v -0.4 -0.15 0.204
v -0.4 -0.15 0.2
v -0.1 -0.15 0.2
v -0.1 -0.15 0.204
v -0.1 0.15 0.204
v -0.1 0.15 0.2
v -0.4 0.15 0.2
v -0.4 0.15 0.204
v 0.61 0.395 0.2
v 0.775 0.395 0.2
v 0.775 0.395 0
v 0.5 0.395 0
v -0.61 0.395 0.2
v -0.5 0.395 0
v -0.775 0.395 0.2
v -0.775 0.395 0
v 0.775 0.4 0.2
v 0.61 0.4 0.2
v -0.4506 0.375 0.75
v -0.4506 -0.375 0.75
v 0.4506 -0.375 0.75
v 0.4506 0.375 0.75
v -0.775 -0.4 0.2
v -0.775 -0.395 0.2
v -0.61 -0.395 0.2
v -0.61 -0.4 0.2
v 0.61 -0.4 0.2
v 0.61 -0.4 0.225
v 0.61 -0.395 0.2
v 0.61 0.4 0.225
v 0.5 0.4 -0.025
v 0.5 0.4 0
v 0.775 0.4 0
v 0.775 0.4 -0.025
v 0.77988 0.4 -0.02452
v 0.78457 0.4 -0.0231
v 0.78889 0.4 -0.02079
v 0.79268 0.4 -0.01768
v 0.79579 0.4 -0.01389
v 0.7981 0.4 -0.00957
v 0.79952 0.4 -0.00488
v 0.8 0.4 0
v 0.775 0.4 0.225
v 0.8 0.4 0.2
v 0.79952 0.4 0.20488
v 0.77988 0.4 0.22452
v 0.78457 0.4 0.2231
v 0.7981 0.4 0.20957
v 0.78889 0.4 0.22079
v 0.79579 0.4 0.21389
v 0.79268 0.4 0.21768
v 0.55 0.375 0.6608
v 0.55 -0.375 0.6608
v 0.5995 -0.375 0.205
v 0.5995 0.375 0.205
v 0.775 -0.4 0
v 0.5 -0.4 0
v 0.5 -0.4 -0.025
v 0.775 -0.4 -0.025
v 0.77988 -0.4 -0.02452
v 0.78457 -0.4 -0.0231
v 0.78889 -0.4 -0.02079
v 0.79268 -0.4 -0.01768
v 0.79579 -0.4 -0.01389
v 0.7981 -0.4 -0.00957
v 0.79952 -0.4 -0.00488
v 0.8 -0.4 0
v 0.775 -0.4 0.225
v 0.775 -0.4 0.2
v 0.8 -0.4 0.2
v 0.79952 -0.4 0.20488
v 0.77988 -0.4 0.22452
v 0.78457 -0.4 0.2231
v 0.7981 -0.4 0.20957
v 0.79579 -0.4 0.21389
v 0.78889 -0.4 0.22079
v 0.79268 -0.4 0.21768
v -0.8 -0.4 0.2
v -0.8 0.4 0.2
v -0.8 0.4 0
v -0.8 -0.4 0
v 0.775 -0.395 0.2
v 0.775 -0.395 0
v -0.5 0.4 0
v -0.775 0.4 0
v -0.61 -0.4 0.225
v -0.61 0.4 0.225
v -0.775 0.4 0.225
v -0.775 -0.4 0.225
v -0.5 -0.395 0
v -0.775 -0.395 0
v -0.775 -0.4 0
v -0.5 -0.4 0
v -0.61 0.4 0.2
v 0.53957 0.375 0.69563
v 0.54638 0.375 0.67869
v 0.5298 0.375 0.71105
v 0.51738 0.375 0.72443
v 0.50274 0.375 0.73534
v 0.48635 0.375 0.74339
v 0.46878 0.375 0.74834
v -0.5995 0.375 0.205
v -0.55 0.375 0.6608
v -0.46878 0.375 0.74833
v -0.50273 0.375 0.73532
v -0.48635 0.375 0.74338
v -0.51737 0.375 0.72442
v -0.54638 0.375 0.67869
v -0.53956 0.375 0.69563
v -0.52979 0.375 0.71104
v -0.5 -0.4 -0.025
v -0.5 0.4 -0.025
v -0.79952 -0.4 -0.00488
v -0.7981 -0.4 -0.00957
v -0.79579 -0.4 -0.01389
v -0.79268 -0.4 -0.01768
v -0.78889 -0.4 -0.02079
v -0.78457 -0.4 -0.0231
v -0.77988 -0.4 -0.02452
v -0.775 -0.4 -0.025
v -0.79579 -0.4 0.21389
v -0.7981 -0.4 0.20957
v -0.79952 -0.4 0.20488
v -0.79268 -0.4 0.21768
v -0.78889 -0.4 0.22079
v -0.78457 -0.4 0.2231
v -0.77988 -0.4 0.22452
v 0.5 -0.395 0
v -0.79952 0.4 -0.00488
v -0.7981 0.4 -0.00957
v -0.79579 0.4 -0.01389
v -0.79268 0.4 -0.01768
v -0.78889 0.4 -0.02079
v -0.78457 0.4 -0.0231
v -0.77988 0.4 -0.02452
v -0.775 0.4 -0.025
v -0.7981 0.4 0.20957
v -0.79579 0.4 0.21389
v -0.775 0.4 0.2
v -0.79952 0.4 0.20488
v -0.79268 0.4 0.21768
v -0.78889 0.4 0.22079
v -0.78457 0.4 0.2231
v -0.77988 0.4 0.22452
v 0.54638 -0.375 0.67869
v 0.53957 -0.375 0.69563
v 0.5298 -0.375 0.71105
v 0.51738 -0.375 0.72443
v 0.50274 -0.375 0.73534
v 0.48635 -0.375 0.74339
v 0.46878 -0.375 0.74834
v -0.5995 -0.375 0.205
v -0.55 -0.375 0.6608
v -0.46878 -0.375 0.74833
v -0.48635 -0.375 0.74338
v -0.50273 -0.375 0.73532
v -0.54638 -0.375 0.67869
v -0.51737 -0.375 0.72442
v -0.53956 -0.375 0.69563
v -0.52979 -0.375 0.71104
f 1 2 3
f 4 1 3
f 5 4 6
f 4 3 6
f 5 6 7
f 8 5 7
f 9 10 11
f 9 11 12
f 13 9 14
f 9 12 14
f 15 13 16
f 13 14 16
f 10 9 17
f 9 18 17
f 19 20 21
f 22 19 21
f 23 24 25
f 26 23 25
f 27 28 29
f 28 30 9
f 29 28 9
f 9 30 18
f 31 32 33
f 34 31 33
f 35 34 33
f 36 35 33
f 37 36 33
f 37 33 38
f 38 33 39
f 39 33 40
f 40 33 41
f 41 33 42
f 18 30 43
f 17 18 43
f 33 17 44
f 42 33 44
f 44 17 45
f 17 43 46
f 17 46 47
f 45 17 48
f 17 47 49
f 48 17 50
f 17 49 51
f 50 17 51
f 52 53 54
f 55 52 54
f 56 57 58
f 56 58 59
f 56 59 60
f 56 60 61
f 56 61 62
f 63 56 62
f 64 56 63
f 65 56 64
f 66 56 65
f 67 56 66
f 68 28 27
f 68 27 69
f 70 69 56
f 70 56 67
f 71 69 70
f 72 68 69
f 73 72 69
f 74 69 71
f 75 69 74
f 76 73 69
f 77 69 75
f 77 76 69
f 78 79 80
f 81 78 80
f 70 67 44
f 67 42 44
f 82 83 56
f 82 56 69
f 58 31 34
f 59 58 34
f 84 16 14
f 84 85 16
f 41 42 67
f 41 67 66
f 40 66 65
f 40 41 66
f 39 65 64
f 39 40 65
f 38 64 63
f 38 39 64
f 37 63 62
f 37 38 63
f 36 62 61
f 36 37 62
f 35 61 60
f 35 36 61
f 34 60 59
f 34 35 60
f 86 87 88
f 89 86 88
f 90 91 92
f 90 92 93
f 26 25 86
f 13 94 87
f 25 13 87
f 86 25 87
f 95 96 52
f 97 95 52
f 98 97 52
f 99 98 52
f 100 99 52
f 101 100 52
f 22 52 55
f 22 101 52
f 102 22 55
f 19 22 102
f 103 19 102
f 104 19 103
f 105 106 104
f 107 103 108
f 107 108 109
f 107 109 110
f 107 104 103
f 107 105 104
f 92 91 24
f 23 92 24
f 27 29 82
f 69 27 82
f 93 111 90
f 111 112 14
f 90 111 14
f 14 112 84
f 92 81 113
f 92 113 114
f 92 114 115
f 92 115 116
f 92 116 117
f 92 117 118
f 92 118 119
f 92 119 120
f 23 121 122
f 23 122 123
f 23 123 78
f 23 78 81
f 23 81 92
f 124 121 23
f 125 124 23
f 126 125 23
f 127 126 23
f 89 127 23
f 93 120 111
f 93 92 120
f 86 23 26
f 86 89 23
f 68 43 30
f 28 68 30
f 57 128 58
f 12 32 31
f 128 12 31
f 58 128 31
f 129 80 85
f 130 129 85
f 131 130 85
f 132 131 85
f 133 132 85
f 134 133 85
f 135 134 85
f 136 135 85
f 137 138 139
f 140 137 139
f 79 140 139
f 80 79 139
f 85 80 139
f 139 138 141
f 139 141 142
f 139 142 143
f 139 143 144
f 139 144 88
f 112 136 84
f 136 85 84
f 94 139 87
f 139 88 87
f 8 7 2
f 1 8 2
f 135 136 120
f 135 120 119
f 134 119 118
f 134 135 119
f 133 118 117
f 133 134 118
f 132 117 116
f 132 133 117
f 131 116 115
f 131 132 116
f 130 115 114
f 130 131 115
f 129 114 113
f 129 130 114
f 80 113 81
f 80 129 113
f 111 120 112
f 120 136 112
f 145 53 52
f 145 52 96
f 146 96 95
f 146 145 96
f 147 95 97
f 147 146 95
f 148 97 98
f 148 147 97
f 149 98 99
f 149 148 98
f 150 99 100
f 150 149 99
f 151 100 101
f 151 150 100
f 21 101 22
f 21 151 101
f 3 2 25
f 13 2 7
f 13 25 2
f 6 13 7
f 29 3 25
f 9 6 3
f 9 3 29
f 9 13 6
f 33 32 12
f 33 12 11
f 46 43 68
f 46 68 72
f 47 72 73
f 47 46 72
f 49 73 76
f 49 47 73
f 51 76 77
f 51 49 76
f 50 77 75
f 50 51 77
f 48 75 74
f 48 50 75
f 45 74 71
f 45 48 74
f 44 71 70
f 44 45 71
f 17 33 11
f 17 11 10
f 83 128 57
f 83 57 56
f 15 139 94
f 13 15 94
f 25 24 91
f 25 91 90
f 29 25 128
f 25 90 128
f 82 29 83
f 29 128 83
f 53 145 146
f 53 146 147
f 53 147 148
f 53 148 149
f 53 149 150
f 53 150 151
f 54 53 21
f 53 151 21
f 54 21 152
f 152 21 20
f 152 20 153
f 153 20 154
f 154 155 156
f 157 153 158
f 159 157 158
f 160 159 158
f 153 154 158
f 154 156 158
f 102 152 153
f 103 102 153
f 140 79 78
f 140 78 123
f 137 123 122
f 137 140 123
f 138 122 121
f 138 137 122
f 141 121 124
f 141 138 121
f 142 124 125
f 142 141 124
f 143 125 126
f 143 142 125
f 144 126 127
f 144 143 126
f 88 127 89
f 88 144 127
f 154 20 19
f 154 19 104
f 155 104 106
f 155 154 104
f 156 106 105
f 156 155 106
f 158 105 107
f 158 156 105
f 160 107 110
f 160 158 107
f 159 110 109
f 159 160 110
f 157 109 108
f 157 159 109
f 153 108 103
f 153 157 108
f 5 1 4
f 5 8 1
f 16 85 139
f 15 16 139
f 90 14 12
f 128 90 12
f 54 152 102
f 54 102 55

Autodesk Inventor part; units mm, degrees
ref_plane "YZ Plane" through (0, 0, 0) normal (1, 0, 0) x (0, 1, 0)
ref_plane "XZ Plane" through (0, 0, 0) normal (0, 1, 0) x (-1, 0, 0)
ref_plane "XY Plane" through (0, 0, 0) normal (0, 0, 1) x (1, 0, 0)
sketch "Sketch1" plane through (0, 0, 0) normal (0, 0, 1) x (1, 0, 0)
  line L0 (-0.775, -0.395) -> (0.775, -0.395)
  line L1 (0.775, -0.395) -> (0.775, 0.395)
  line L2 (0.775, 0.395) -> (-0.775, 0.395)
  line L3 (-0.775, 0.395) -> (-0.775, -0.395)
  line L4 (-0.775, -0.395) -> (0.775, 0.395) construction
  line L5 (0.775, -0.395) -> (-0.775, 0.395) construction
  point P0 (0, 0)
  dimension "d0" = 1.55
  dimension "d1" = 0.79
extrude "Extrusion1" add sketch "Sketch1" along normal blind 0.2
sketch "Sketch2" plane through (0, 0, 0) normal (0, 1, 0) x (-1, 0, 0)
  line L0 (0.775, 0) -> (-0.775, 0) projected
  line L1 (-0.775, 0) -> (-0.775, 0.2) projected
  line L2 (0.775, 0.2) -> (-0.775, 0.2) projected
  line L3 (0.775, 0) -> (0.775, 0.2) projected
  line L4 (0.6, 0.2) -> (0.55, 0.6608)
  arc A0 (0.55, 0.6608) -> (0.4506, 0.75) centre (0.4506, 0.65) ccw
  line L5 (0.4506, 0.75) -> (-0.4506, 0.75)
  arc A1 (-0.4506, 0.75) -> (-0.55, 0.6608) centre (-0.4506, 0.65) ccw
  line L6 (-0.55, 0.6608) -> (-0.6, 0.2)
  line L7 (0.5995, 0.205) -> (-0.5995, 0.205)
  point P0 (0, 0)
  point P1 (0, 0.75)
  point P2 (0, 0.2)
  dimension "d7" = 1.2
  dimension "d8" = 1.1
  dimension "d9" = 0.1
  dimension "d22" = 0.75
  dimension "d23" = 0.005
extrude "Extrusion3" add sketch "Sketch2" along normal mid plane 0.75 contours L7 L6 A1 L5 A0 L4
sketch "Sketch3" plane through (-0.775, 0, 0) normal (0, -1, 0) x (1, 0, 0)
  line L0 (0, 0) -> (1.55, 0) projected
  line L1 (1.55, 0) -> (1.55, 0.2) projected
  line L2 (0, 0.2) -> (1.55, 0.2) projected
  line L3 (0, 0) -> (0, 0.2) projected
  line L4 (0, 0.2) -> (1.55, 0.2) projected
  line L5 (0.165, 0.2) -> (0.165, 0.225)
  line L6 (0.165, 0.225) -> (0, 0.225)
  arc A0 (0, 0.225) -> (-0.025, 0.2) centre (0, 0.2) ccw
  line L7 (-0.025, 0.2) -> (-0.025, 0)
  arc A1 (-0.025, 0) -> (0, -0.025) centre (0, 0) ccw
  line L8 (0, -0.025) -> (0.275, -0.025)
  line L9 (0.275, -0.025) -> (0.275, 0)
  line L10 (0, 0) -> (1.55, 0) projected
  line L11 (1.275, 0) -> (1.275, -0.025)
  line L12 (1.275, -0.025) -> (1.55, -0.025)
  arc A2 (1.55, -0.025) -> (1.575, 0) centre (1.55, 0) ccw
  line L13 (1.575, 0) -> (1.575, 0.2)
  arc A3 (1.575, 0.2) -> (1.55, 0.225) centre (1.55, 0.2) ccw
  line L14 (1.55, 0.225) -> (1.385, 0.225)
  line L15 (1.385, 0.225) -> (1.385, 0.2)
  point P0 (0.775, 0)
  dimension "d13" = 1.6
  dimension "d14" = 0.3
  dimension "d15" = 0.19
extrude "Extrusion4" add sketch "Sketch3" along normal mid plane 0.8 contours L0 L9 L8 A1 L7 A0 L6 L5 L2 L3 | L0 L1 L2 L15 L14 A3 L13 A2 L12 L11
sketch "Sketch4" plane through (0, 0, 0.2) normal (0, 0, 1) x (1, 0, 0)
  line L0 (-0.775, 0.4) -> (-0.775, -0.4) projected
  line L1 (-0.61, -0.4) -> (-0.775, -0.4) projected
  line L2 (-0.61, 0.4) -> (-0.61, -0.4) projected
  line L3 (-0.775, 0.4) -> (-0.61, 0.4) projected
  line L4 (0.61, 0.4) -> (0.61, -0.4) projected
  line L5 (0.775, -0.4) -> (0.61, -0.4) projected
  line L6 (0.775, 0.4) -> (0.775, -0.4) projected
  line L7 (0.61, 0.4) -> (0.775, 0.4) projected
  line L8 (-0.4, -0.15) -> (-0.1, -0.15)
  line L9 (-0.1, -0.15) -> (-0.1, 0.15)
  line L10 (-0.1, 0.15) -> (-0.4, 0.15)
  line L11 (-0.4, 0.15) -> (-0.4, -0.15)
  line L12 (-0.4, -0.15) -> (-0.1, 0.15) construction
  line L13 (-0.1, -0.15) -> (-0.4, 0.15) construction
  point P0 (0, 0)
  point P1 (-0.25, 0)
  point P2 (-0.25, 0)
  dimension "d18" = 0.25
  dimension "d19" = 0.3
extrude "Extrusion5" add sketch "Sketch4" along normal blind 0.004 contours L11 L10 L9 L8
properties part number "63-0001" material "ABS Plastic"
